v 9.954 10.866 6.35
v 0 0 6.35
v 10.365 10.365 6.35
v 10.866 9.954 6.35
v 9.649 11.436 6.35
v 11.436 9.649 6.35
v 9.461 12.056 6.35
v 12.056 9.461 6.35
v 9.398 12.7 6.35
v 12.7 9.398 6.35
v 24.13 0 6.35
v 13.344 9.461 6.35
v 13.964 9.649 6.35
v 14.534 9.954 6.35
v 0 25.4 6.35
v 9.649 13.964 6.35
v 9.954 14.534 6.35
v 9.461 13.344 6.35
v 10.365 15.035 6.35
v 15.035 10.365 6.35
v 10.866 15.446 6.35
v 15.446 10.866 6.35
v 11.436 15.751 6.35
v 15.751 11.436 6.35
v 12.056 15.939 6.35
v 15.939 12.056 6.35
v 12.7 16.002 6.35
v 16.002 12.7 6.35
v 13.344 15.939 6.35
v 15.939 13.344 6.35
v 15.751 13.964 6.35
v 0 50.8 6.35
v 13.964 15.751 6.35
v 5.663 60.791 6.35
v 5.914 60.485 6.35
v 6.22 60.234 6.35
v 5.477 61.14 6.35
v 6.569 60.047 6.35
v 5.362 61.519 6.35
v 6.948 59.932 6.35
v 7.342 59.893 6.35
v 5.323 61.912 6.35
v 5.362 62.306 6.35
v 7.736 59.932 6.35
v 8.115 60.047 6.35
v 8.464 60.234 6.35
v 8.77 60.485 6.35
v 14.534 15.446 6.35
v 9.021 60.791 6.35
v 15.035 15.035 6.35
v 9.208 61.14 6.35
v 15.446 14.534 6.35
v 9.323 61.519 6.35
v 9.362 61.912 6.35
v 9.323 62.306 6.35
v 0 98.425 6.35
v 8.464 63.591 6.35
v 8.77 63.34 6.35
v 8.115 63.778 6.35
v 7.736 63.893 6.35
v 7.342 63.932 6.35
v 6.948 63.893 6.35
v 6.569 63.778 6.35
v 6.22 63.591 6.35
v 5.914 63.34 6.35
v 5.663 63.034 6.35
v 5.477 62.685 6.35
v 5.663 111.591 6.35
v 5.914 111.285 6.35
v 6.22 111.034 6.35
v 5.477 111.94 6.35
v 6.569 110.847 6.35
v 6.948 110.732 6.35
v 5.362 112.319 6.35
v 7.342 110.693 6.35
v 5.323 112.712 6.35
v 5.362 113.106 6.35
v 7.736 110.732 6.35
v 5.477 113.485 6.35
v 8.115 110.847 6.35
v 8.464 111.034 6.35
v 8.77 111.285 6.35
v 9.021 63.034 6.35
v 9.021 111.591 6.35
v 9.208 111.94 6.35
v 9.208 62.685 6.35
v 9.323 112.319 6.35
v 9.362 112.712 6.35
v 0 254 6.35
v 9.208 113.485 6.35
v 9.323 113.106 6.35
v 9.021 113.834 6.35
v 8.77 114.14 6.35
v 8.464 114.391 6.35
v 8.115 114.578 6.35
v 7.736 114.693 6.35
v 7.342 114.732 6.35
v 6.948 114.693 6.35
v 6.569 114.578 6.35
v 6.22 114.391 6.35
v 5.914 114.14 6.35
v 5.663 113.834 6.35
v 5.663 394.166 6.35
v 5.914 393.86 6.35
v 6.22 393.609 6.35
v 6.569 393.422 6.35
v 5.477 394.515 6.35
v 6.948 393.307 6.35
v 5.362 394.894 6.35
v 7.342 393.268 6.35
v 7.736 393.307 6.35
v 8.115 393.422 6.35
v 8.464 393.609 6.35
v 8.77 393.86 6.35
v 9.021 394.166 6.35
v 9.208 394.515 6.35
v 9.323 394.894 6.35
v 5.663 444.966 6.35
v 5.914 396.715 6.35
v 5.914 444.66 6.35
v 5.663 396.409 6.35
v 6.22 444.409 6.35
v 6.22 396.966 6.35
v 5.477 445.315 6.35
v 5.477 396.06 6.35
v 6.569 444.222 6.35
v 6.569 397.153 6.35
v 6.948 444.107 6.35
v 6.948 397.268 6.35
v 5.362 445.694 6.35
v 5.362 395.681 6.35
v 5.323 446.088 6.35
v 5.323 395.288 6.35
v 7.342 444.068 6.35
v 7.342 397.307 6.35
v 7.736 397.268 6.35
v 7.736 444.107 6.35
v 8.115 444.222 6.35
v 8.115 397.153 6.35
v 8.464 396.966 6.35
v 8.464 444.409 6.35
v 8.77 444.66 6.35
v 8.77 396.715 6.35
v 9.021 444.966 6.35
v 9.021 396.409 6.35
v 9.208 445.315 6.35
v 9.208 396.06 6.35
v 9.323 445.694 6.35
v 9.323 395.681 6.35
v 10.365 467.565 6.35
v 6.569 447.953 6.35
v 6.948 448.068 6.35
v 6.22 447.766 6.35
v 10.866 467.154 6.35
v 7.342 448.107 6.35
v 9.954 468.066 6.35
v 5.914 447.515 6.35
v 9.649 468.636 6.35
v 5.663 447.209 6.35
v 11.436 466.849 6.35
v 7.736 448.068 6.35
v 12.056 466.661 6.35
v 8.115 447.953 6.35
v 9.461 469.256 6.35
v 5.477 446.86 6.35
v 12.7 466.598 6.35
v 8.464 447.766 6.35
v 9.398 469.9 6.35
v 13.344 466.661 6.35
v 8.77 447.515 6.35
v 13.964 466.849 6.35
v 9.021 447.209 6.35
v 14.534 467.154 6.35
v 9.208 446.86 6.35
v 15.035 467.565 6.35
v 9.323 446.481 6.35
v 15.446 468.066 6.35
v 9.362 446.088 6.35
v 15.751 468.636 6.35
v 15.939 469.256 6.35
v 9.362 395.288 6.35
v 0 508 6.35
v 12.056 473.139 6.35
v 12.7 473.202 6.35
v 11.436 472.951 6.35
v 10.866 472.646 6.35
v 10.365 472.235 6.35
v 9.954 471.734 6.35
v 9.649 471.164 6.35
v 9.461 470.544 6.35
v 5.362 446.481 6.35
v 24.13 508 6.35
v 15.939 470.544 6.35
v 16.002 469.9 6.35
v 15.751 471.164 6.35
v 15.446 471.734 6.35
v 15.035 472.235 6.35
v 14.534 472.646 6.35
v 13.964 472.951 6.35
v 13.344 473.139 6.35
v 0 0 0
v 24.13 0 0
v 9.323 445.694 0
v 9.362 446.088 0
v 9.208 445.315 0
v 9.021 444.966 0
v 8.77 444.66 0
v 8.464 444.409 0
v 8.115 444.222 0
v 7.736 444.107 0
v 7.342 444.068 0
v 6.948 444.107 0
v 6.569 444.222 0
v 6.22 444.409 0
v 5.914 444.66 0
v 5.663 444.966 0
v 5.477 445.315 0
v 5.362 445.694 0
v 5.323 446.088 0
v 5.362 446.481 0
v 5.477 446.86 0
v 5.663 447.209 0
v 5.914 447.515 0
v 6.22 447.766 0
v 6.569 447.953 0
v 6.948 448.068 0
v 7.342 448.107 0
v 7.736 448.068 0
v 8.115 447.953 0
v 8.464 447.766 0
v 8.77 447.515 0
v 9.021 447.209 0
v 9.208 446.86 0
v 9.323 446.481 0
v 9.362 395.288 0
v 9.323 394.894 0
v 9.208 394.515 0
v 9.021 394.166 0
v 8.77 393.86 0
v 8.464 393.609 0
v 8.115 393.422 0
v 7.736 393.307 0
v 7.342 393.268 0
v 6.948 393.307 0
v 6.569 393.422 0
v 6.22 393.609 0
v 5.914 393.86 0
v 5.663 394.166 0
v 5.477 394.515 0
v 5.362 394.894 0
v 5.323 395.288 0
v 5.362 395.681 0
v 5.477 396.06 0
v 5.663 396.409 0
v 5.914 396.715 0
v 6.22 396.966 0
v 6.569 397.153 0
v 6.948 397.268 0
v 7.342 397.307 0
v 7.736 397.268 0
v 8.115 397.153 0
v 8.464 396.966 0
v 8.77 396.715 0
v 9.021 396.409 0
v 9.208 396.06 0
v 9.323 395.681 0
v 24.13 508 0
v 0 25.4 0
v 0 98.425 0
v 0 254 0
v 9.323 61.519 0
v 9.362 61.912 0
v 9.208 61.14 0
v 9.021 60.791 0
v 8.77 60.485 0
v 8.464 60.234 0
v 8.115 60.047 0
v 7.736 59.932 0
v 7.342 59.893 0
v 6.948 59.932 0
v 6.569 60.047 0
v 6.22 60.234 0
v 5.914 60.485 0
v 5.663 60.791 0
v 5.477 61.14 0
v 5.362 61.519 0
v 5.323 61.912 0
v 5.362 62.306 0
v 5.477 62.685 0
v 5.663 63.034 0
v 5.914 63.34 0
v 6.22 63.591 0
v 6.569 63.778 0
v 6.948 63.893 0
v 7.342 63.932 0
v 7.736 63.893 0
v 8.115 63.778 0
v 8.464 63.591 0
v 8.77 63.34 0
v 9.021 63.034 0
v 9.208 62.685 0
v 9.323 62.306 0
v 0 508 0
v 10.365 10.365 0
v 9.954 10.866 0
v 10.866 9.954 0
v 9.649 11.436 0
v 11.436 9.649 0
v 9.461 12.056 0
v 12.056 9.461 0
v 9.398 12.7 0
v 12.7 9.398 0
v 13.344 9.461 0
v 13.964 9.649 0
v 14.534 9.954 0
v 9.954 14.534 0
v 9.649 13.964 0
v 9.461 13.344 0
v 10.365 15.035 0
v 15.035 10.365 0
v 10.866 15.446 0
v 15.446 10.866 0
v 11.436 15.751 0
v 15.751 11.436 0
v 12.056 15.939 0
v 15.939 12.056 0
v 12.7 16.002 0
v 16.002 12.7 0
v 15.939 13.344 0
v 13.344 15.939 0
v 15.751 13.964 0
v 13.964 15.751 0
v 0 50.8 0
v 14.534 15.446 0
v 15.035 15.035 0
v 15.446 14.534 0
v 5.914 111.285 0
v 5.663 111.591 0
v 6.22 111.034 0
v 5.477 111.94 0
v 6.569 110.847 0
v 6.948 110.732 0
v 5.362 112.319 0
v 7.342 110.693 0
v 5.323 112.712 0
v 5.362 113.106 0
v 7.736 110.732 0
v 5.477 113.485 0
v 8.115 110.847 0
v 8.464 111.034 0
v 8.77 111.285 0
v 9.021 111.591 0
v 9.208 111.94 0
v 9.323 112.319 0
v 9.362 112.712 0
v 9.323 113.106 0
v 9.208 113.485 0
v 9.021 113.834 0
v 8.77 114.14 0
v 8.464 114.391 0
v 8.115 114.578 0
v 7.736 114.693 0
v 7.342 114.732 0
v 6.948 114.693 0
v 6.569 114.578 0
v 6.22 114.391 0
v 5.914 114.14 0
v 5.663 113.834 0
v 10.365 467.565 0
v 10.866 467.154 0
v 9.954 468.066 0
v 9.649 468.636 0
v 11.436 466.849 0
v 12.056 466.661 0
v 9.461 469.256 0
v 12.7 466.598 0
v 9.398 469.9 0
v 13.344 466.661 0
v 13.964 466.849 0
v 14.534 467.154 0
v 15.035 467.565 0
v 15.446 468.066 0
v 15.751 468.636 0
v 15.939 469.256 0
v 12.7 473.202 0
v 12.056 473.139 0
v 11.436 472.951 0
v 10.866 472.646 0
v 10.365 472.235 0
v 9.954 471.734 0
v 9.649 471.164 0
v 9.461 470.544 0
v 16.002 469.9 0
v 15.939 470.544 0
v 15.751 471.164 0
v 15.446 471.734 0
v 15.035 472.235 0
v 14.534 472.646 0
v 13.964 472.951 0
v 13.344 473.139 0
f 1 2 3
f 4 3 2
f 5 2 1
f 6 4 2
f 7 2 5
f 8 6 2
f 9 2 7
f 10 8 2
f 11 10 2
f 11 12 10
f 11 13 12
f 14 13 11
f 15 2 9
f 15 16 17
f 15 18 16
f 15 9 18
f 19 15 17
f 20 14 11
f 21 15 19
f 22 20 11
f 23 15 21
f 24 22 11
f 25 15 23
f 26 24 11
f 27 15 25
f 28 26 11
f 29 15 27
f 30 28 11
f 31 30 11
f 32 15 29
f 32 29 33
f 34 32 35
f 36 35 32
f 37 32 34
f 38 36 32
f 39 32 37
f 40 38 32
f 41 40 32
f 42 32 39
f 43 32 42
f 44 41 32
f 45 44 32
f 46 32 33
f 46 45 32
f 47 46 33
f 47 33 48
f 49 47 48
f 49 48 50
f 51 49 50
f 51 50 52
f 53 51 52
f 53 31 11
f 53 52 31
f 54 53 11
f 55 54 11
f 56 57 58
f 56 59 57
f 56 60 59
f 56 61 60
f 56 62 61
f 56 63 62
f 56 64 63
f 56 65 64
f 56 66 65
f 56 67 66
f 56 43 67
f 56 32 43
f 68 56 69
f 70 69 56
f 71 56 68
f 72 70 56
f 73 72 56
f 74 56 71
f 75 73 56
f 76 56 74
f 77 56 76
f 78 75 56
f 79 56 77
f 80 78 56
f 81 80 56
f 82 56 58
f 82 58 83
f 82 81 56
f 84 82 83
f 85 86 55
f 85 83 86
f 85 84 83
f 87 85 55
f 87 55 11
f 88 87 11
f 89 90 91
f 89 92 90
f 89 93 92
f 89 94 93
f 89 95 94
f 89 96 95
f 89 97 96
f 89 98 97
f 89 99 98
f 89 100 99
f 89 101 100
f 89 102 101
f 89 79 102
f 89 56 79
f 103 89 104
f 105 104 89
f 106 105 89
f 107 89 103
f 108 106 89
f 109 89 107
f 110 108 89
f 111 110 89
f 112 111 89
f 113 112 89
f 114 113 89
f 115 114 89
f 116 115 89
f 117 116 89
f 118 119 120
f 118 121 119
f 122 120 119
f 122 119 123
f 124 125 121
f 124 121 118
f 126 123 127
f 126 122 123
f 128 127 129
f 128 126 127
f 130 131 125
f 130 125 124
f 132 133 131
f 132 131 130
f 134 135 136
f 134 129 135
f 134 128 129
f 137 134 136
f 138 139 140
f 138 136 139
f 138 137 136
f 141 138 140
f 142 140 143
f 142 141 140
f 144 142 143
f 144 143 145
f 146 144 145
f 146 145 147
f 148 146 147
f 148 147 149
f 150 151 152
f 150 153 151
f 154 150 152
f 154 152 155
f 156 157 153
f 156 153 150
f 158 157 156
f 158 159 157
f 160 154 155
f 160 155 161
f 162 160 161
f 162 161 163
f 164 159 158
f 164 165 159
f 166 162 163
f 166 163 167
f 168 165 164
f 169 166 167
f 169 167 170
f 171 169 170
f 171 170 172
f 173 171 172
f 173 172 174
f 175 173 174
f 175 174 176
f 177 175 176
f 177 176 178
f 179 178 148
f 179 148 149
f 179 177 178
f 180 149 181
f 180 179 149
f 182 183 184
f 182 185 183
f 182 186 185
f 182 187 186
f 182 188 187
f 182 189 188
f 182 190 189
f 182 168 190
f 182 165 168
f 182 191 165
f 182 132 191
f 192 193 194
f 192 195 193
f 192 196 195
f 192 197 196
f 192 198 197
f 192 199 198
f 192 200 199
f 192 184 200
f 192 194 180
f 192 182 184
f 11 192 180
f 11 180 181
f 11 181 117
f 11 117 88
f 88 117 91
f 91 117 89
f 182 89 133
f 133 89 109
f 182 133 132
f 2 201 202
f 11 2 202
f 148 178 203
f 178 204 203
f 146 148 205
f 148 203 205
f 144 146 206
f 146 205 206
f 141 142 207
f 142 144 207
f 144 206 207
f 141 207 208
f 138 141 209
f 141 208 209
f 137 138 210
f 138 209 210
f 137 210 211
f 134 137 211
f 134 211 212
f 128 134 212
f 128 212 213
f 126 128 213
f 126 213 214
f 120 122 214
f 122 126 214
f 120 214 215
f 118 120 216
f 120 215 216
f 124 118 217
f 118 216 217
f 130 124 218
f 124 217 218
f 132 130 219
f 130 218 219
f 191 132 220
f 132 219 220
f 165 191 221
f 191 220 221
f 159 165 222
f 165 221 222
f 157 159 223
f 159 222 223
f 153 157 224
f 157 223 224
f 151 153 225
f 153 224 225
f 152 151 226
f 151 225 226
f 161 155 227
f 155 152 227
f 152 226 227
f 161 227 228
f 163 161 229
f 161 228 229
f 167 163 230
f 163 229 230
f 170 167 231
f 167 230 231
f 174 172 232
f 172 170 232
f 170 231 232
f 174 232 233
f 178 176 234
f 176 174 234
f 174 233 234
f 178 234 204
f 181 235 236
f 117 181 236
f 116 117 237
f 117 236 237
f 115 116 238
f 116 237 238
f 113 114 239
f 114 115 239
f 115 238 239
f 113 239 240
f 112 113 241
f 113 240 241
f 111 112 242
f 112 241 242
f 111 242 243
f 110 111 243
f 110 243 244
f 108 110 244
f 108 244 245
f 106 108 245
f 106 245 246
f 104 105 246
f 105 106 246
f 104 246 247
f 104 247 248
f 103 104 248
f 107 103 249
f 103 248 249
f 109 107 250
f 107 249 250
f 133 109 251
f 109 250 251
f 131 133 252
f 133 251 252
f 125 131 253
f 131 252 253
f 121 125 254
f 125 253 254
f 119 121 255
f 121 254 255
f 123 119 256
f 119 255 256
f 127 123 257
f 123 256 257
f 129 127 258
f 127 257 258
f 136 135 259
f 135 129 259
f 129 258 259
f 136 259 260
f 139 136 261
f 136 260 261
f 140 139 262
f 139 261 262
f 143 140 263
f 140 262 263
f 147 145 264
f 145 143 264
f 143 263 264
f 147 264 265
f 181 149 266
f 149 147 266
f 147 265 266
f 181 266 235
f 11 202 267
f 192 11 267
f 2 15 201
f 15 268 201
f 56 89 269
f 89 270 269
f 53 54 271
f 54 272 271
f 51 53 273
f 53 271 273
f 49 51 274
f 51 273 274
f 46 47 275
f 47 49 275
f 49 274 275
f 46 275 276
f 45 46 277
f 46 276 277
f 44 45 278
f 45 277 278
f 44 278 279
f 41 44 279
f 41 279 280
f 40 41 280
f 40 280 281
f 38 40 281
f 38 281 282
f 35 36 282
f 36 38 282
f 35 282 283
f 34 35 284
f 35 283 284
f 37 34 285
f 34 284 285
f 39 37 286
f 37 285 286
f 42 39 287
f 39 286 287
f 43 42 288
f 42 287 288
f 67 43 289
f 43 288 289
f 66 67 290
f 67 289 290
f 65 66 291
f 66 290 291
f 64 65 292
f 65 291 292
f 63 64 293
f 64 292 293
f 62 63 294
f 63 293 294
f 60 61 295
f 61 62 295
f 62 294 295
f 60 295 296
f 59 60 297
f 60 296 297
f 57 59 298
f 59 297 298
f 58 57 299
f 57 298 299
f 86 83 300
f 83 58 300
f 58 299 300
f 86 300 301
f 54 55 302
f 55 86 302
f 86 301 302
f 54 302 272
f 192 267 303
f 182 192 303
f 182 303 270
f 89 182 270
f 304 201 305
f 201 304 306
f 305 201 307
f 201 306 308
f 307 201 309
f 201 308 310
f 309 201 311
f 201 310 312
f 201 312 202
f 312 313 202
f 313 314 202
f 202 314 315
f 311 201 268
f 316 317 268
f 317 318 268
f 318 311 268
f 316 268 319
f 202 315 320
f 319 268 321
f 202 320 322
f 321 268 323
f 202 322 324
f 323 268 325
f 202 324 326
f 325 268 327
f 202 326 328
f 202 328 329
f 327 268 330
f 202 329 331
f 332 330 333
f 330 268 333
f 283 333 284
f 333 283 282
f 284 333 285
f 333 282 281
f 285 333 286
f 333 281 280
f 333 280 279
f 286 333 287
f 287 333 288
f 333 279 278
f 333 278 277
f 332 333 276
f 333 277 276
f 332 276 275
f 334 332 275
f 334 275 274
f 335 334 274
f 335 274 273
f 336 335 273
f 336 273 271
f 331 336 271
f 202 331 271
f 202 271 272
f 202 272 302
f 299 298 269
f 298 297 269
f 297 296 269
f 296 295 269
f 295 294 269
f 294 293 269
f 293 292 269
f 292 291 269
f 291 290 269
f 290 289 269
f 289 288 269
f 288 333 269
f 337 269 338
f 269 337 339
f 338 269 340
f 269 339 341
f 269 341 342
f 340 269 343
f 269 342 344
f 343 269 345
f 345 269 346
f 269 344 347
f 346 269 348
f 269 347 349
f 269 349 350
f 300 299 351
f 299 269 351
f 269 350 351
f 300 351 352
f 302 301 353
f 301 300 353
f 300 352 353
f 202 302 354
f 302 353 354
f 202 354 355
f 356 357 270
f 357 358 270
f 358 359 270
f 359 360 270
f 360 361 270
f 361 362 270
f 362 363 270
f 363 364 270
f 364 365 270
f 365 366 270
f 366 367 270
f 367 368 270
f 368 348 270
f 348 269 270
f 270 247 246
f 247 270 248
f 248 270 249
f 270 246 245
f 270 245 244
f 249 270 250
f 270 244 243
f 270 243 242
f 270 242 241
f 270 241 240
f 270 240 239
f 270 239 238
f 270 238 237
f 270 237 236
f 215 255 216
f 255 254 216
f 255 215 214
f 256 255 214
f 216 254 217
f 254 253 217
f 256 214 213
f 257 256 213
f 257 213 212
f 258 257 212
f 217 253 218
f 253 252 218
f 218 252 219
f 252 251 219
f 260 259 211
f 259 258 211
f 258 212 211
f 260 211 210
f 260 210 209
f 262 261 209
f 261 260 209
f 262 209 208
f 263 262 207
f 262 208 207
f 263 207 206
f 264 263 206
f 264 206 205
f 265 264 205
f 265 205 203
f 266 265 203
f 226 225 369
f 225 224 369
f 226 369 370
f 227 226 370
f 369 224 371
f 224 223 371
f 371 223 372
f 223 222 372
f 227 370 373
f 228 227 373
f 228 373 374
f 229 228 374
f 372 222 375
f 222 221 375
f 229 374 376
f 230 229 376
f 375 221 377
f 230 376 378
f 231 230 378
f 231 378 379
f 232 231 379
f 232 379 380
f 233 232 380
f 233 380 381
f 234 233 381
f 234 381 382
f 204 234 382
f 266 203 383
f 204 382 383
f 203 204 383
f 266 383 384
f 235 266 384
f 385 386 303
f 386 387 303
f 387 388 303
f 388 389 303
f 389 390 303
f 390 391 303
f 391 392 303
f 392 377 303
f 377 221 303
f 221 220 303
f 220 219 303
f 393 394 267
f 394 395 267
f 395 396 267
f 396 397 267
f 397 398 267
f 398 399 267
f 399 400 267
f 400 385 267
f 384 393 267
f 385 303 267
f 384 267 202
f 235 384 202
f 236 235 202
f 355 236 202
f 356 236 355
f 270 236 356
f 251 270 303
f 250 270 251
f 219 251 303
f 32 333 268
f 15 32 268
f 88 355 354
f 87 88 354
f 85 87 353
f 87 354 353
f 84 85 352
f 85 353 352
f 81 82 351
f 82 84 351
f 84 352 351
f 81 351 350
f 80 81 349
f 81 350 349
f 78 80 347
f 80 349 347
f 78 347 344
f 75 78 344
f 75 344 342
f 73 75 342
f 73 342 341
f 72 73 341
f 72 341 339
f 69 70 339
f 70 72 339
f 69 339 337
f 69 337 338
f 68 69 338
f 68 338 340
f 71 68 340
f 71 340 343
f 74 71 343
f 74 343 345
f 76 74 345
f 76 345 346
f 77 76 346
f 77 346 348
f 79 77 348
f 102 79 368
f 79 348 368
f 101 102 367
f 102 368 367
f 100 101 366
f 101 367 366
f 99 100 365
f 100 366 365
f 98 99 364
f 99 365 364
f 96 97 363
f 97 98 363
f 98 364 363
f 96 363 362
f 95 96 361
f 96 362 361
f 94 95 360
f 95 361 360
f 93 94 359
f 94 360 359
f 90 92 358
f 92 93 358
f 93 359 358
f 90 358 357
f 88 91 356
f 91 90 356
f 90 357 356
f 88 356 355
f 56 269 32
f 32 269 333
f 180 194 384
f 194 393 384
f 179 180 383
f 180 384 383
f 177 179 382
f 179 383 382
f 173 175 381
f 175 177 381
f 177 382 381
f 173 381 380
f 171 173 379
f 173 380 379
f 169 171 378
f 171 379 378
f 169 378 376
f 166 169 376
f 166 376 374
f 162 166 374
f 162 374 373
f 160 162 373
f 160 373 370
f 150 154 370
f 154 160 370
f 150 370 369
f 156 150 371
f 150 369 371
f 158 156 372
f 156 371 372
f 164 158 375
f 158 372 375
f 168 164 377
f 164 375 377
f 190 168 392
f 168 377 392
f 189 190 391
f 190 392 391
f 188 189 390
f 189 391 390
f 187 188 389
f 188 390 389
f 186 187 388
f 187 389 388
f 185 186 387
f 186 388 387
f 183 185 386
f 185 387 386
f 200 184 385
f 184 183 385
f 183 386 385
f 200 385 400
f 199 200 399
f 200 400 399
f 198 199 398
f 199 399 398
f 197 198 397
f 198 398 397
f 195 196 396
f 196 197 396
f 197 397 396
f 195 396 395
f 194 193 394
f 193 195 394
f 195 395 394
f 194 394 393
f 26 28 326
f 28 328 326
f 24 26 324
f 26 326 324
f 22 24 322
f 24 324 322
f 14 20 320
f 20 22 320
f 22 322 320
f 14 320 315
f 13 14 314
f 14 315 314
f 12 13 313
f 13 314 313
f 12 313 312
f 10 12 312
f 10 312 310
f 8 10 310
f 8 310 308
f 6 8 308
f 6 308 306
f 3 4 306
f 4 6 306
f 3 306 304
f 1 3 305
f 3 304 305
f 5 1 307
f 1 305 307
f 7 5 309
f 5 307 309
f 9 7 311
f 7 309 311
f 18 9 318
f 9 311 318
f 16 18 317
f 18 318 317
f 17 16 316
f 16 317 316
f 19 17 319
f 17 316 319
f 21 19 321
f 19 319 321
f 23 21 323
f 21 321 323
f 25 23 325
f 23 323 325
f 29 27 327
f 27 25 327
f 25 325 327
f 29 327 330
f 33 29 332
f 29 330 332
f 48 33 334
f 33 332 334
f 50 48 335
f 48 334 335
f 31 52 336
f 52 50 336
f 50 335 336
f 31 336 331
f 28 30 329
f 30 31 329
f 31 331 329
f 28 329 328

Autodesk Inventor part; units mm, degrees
ref_plane "YZ Plane" through (0, 0, 0) normal (1, 0, 0) x (0, 1, 0)
ref_plane "XZ Plane" through (0, 0, 0) normal (0, 1, 0) x (-1, 0, 0)
ref_plane "XY Plane" through (0, 0, 0) normal (0, 0, 1) x (1, 0, 0)
sketch "Sketch1" plane through (0, 0, 0) normal (0, 0, 1) x (1, 0, 0)
  line L0 (0, 0) -> (24.13, 0)
  line L1 (24.13, 0) -> (24.13, 508)
  line L2 (24.13, 508) -> (0, 508)
  line L3 (0, 508) -> (0, 0)
  line L4 (0, 0) -> (25.4, 0)
  line L5 (25.4, 0) -> (25.4, 25.4)
  line L6 (25.4, 50.8) -> (0, 50.8) construction
  line L7 (0, 25.4) -> (0, 0)
  line L8 (0, 50.8) -> (25.4, 50.8) construction
  line L9 (25.4, 25.4) -> (25.4, 98.425)
  line L10 (25.4, 123.825) -> (0, 123.825) construction
  line L11 (0, 98.425) -> (0, 25.4)
  line L12 (25.4, 98.425) -> (25.4, 87.3125)
  line L13 (25.4, 112.7125) -> (7.3422, 112.7125) construction
  circle A0 centre (7.3422, 112.7125) radius 2.0193
  line L14 (25.4, 87.3125) -> (25.4, 61.9125)
  line L15 (25.4, 87.3125) -> (8.6883, 87.3125) construction
  circle A1 centre (7.3422, 61.9125) radius 2.0193
  line L16 (0, 25.4) -> (0, 50.8)
  line L17 (0, 25.4) -> (12.7, 25.4) construction
  line L18 (0, 0) -> (0, 254)
  line L19 (0, 254) -> (96.9317, 254) construction
  circle A2 centre (7.3422, 395.2875) radius 2.0193
  circle A3 centre (7.3422, 446.0875) radius 2.0193
  circle A4 centre (12.7, 469.9) radius 3.302
  circle A5 centre (12.7, 12.7) radius 3.302
  dimension "d0" = 24.13
  dimension "d1" = 508
  dimension "d2" = 25.4
  dimension "d3" = 73.025
  dimension "d4" = 11.1125
  dimension "d5" = 18.0578
  dimension "d6" = 4.0386
  dimension "d7" = 25.4
  dimension "d8" = 25.4
  dimension "d12" = 254
  dimension "d16" = 6.604
extrude "Extrusion2" add sketch "Sketch1" along normal blind 6.35
properties part number "vrRig_v08_enclosure_hingeMount"
